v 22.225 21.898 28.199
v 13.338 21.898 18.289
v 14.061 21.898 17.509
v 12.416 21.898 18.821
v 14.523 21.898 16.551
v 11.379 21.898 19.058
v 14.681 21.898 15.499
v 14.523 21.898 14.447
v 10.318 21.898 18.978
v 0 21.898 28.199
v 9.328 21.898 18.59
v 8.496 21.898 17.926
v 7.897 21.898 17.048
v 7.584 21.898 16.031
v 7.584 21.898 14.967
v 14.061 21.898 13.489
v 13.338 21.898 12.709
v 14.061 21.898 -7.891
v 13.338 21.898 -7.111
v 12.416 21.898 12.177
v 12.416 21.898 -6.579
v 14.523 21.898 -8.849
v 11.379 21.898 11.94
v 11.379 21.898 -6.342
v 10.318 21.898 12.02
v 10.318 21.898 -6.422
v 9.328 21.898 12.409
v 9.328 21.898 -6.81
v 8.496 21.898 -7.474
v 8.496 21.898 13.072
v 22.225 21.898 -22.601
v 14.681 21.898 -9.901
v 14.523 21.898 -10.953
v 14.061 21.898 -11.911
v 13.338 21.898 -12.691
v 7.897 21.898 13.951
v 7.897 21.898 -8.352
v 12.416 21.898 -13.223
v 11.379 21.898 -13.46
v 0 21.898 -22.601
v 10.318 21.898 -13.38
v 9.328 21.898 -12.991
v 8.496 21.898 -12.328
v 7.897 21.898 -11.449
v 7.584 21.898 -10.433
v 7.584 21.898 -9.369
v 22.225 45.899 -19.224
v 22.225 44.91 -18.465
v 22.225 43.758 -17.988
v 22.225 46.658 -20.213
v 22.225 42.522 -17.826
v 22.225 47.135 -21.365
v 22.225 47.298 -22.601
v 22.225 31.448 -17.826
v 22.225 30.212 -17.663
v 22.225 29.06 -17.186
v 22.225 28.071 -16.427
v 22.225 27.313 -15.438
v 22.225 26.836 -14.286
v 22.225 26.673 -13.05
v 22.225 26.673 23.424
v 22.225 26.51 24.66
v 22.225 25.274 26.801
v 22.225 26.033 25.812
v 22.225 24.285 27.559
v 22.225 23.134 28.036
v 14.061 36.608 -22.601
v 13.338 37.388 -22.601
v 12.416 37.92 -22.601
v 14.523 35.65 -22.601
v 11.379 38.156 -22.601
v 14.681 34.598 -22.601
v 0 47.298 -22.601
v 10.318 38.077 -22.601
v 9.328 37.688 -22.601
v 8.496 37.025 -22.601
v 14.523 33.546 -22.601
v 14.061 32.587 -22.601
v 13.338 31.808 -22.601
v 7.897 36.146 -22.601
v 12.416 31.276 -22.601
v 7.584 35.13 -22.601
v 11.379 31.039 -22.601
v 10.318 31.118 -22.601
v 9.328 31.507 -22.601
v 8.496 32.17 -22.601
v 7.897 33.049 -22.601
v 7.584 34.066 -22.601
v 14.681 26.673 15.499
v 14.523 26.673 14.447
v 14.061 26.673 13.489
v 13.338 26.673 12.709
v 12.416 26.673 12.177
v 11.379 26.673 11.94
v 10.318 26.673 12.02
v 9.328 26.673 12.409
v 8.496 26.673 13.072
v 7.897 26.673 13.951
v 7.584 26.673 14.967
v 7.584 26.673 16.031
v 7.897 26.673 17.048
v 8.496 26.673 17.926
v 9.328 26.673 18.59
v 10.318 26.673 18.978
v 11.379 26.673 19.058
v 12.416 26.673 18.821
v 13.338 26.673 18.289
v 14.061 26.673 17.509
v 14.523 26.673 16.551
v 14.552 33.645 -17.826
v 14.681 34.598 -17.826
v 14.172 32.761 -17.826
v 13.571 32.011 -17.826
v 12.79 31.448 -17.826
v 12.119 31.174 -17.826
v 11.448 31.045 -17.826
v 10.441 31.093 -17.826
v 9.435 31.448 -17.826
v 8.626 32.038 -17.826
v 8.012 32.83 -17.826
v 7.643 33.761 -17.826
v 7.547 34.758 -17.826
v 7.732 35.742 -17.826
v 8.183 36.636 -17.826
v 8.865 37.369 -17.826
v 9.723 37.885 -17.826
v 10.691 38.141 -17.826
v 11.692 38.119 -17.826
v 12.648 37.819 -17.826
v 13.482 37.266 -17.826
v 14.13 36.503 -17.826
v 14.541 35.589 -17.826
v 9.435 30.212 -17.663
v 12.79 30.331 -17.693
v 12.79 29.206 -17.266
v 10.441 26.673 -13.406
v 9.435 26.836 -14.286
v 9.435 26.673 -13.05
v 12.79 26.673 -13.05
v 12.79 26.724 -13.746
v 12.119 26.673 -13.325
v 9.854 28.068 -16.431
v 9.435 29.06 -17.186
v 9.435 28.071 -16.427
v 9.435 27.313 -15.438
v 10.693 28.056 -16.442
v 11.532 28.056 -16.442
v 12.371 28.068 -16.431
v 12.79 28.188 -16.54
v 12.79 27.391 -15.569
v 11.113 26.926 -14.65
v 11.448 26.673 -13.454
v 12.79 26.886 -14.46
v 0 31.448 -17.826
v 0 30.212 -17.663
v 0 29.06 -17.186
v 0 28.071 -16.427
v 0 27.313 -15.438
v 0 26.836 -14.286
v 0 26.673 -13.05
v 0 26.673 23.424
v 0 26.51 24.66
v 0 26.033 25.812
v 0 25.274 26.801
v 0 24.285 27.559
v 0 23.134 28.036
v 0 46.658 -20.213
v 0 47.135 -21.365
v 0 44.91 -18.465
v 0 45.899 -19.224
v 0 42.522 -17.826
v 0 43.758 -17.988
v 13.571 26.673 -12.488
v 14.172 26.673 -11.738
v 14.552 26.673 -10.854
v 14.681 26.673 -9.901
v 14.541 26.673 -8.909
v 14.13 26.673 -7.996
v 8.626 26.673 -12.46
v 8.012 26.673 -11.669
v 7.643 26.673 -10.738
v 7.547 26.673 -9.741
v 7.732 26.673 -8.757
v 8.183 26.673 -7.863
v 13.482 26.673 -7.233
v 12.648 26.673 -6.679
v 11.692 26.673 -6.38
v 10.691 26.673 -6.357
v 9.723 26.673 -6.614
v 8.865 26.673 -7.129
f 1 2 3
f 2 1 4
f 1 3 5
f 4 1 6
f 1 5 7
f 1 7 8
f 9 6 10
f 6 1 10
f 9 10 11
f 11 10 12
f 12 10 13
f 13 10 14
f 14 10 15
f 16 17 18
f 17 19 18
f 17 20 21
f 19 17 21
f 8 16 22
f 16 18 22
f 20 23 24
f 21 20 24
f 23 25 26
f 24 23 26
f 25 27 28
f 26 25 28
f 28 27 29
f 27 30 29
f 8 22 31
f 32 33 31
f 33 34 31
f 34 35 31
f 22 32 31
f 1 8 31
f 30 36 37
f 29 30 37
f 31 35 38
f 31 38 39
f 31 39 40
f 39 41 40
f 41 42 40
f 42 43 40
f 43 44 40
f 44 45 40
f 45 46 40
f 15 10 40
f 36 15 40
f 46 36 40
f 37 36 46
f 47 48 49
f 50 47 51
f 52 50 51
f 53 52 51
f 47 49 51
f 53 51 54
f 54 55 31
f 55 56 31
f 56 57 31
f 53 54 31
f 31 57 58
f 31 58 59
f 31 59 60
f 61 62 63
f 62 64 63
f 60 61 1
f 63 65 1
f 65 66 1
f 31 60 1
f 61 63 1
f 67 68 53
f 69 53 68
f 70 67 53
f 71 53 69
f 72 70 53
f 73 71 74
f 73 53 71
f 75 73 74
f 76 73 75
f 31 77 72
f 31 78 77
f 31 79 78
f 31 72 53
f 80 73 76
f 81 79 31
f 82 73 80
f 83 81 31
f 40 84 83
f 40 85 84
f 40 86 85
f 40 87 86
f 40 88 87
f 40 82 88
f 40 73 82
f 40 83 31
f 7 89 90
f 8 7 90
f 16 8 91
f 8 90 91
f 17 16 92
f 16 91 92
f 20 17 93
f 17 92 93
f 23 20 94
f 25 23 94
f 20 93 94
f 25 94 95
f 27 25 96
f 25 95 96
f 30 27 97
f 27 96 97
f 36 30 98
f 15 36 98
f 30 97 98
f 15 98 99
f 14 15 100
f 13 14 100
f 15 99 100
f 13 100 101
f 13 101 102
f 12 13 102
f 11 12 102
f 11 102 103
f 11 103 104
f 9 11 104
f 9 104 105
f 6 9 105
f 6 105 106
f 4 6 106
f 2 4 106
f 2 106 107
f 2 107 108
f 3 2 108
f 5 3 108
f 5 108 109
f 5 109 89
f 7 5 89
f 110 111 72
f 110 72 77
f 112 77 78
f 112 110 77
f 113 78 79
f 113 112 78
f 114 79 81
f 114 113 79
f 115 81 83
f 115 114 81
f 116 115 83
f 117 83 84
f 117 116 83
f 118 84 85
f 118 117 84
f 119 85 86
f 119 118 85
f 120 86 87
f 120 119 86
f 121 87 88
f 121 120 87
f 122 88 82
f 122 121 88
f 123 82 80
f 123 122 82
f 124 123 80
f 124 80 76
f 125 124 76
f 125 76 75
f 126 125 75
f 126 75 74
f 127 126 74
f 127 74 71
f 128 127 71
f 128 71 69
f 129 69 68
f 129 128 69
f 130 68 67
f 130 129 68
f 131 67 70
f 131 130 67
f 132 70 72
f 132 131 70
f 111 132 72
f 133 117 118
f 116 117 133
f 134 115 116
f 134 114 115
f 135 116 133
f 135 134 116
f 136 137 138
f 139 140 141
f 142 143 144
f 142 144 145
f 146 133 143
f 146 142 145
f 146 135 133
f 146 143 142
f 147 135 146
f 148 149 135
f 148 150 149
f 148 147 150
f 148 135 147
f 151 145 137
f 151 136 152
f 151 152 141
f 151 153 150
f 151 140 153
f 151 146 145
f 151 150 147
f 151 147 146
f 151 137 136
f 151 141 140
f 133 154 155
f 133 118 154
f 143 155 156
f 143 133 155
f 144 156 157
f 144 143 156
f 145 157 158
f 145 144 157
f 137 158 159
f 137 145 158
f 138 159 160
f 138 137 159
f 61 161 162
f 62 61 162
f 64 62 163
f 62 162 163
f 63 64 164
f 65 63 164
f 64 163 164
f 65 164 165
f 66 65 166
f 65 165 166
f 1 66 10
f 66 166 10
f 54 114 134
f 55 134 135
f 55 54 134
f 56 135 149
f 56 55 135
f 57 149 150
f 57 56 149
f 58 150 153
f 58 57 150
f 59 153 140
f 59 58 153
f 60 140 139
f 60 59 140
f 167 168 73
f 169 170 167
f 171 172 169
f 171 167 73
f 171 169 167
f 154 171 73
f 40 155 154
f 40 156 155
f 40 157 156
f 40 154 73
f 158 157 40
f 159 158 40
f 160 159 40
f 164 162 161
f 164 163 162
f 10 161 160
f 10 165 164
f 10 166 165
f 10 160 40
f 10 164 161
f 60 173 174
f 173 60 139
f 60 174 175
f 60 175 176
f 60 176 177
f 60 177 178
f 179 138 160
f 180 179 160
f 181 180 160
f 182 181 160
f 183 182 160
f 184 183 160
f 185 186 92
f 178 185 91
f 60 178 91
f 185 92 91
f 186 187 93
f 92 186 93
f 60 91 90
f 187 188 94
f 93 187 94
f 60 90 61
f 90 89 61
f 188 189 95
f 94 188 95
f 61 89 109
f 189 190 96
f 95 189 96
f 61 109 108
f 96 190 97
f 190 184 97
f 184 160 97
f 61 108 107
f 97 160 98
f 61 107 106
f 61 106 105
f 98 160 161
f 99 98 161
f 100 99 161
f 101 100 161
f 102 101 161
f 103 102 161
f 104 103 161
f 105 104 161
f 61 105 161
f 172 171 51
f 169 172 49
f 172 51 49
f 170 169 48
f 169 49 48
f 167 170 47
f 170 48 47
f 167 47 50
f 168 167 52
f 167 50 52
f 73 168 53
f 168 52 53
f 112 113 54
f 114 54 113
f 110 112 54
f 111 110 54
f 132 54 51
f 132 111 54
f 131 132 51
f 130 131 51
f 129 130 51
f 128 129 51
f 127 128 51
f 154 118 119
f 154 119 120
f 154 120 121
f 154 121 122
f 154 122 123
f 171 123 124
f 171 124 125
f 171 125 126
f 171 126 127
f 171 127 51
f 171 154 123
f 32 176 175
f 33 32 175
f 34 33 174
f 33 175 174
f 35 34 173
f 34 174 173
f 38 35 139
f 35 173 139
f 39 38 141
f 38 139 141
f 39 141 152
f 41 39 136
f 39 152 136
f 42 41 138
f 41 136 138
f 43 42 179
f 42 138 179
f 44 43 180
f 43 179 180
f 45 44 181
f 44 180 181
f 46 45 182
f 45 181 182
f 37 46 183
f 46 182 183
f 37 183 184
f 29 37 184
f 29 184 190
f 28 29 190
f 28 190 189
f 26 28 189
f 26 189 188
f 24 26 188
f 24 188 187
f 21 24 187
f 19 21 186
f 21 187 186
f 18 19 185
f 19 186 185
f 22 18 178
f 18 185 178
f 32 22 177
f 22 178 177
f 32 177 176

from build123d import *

# Parameters (mm, degrees)
EXTRUDE1_DEPTH     = 22.225
SKETCH2_R          = 3.5687
CUT_EXTRUDE1_DEPTH = 5.7752
FILLET1_R          = 4.7752
CUT_EXTRUDE2_DEPTH = 23.225


with BuildPart() as part:
    # Sketch1 → Extrude1 (new body)
    with BuildSketch(Plane(origin=(0, 0, 0), x_dir=(0, 0, -1), z_dir=(1, 0, 0))):
        with BuildLine():
            Line((-28.199163803, 21.897674685), (22.600836197, 21.897674685))
            Line((22.600836197, 21.897674685), (17.825636197, 26.672874685))
            Line((17.825636197, 26.672874685), (-23.423963803, 26.672874685))
            ThreePointArc((-23.423963803, 26.672874685), (-26.800540105, 25.274250987), (-28.199163803, 21.897674685))
        make_face()
    extrude(amount=EXTRUDE1_DEPTH)

    # Sketch2 → Cut-Extrude1 (cut, through all)
    with BuildSketch(Plane(origin=(0, 26.672874685, 0), x_dir=(1, 0, 0), z_dir=(0, 1, 0))):
        with Locations((11.1125, -15.499163803)):
            Circle(SKETCH2_R)
        with Locations((11.1125, 9.900836197)):
            Circle(SKETCH2_R)
    extrude(amount=-CUT_EXTRUDE1_DEPTH, mode=Mode.SUBTRACT)

    # Mirror1: part across plane


with BuildPart() as part_1:
    add(part.part)
    add(part.part.mirror(Plane(origin=(22.225, 21.897674685, -22.600836197), x_dir=(0, 0.707106781, 0.707106781), z_dir=(0, -0.707106781, 0.707106781))))

    # Fillet1
    fillet1_edges = [part_1.edges().sort_by_distance(p)[0] for p in [
        (11.1125, 26.672874685, -17.825636197),
    ]]
    fillet(fillet1_edges, radius=FILLET1_R)

    # Sketch3 → Cut-Extrude2 (cut, through all)
    with BuildSketch(Plane(origin=(22.225, 0, 0), x_dir=(0, 0, -1), z_dir=(1, 0, 0))):
        with BuildLine():
            Line((17.825636197, 67.922474685), (17.825636197, 42.522474685))
            ThreePointArc((17.825636197, 42.522474685), (19.224259895, 45.899050987), (22.600836197, 47.297674685))
            Line((22.600836197, 47.297674685), (22.600836197, 72.697674685))
            ThreePointArc((22.600836197, 72.697674685), (19.224259895, 71.299050987), (17.825636197, 67.922474685))
        make_face()
    extrude(amount=-CUT_EXTRUDE2_DEPTH, mode=Mode.SUBTRACT)


solid = part_1.part
